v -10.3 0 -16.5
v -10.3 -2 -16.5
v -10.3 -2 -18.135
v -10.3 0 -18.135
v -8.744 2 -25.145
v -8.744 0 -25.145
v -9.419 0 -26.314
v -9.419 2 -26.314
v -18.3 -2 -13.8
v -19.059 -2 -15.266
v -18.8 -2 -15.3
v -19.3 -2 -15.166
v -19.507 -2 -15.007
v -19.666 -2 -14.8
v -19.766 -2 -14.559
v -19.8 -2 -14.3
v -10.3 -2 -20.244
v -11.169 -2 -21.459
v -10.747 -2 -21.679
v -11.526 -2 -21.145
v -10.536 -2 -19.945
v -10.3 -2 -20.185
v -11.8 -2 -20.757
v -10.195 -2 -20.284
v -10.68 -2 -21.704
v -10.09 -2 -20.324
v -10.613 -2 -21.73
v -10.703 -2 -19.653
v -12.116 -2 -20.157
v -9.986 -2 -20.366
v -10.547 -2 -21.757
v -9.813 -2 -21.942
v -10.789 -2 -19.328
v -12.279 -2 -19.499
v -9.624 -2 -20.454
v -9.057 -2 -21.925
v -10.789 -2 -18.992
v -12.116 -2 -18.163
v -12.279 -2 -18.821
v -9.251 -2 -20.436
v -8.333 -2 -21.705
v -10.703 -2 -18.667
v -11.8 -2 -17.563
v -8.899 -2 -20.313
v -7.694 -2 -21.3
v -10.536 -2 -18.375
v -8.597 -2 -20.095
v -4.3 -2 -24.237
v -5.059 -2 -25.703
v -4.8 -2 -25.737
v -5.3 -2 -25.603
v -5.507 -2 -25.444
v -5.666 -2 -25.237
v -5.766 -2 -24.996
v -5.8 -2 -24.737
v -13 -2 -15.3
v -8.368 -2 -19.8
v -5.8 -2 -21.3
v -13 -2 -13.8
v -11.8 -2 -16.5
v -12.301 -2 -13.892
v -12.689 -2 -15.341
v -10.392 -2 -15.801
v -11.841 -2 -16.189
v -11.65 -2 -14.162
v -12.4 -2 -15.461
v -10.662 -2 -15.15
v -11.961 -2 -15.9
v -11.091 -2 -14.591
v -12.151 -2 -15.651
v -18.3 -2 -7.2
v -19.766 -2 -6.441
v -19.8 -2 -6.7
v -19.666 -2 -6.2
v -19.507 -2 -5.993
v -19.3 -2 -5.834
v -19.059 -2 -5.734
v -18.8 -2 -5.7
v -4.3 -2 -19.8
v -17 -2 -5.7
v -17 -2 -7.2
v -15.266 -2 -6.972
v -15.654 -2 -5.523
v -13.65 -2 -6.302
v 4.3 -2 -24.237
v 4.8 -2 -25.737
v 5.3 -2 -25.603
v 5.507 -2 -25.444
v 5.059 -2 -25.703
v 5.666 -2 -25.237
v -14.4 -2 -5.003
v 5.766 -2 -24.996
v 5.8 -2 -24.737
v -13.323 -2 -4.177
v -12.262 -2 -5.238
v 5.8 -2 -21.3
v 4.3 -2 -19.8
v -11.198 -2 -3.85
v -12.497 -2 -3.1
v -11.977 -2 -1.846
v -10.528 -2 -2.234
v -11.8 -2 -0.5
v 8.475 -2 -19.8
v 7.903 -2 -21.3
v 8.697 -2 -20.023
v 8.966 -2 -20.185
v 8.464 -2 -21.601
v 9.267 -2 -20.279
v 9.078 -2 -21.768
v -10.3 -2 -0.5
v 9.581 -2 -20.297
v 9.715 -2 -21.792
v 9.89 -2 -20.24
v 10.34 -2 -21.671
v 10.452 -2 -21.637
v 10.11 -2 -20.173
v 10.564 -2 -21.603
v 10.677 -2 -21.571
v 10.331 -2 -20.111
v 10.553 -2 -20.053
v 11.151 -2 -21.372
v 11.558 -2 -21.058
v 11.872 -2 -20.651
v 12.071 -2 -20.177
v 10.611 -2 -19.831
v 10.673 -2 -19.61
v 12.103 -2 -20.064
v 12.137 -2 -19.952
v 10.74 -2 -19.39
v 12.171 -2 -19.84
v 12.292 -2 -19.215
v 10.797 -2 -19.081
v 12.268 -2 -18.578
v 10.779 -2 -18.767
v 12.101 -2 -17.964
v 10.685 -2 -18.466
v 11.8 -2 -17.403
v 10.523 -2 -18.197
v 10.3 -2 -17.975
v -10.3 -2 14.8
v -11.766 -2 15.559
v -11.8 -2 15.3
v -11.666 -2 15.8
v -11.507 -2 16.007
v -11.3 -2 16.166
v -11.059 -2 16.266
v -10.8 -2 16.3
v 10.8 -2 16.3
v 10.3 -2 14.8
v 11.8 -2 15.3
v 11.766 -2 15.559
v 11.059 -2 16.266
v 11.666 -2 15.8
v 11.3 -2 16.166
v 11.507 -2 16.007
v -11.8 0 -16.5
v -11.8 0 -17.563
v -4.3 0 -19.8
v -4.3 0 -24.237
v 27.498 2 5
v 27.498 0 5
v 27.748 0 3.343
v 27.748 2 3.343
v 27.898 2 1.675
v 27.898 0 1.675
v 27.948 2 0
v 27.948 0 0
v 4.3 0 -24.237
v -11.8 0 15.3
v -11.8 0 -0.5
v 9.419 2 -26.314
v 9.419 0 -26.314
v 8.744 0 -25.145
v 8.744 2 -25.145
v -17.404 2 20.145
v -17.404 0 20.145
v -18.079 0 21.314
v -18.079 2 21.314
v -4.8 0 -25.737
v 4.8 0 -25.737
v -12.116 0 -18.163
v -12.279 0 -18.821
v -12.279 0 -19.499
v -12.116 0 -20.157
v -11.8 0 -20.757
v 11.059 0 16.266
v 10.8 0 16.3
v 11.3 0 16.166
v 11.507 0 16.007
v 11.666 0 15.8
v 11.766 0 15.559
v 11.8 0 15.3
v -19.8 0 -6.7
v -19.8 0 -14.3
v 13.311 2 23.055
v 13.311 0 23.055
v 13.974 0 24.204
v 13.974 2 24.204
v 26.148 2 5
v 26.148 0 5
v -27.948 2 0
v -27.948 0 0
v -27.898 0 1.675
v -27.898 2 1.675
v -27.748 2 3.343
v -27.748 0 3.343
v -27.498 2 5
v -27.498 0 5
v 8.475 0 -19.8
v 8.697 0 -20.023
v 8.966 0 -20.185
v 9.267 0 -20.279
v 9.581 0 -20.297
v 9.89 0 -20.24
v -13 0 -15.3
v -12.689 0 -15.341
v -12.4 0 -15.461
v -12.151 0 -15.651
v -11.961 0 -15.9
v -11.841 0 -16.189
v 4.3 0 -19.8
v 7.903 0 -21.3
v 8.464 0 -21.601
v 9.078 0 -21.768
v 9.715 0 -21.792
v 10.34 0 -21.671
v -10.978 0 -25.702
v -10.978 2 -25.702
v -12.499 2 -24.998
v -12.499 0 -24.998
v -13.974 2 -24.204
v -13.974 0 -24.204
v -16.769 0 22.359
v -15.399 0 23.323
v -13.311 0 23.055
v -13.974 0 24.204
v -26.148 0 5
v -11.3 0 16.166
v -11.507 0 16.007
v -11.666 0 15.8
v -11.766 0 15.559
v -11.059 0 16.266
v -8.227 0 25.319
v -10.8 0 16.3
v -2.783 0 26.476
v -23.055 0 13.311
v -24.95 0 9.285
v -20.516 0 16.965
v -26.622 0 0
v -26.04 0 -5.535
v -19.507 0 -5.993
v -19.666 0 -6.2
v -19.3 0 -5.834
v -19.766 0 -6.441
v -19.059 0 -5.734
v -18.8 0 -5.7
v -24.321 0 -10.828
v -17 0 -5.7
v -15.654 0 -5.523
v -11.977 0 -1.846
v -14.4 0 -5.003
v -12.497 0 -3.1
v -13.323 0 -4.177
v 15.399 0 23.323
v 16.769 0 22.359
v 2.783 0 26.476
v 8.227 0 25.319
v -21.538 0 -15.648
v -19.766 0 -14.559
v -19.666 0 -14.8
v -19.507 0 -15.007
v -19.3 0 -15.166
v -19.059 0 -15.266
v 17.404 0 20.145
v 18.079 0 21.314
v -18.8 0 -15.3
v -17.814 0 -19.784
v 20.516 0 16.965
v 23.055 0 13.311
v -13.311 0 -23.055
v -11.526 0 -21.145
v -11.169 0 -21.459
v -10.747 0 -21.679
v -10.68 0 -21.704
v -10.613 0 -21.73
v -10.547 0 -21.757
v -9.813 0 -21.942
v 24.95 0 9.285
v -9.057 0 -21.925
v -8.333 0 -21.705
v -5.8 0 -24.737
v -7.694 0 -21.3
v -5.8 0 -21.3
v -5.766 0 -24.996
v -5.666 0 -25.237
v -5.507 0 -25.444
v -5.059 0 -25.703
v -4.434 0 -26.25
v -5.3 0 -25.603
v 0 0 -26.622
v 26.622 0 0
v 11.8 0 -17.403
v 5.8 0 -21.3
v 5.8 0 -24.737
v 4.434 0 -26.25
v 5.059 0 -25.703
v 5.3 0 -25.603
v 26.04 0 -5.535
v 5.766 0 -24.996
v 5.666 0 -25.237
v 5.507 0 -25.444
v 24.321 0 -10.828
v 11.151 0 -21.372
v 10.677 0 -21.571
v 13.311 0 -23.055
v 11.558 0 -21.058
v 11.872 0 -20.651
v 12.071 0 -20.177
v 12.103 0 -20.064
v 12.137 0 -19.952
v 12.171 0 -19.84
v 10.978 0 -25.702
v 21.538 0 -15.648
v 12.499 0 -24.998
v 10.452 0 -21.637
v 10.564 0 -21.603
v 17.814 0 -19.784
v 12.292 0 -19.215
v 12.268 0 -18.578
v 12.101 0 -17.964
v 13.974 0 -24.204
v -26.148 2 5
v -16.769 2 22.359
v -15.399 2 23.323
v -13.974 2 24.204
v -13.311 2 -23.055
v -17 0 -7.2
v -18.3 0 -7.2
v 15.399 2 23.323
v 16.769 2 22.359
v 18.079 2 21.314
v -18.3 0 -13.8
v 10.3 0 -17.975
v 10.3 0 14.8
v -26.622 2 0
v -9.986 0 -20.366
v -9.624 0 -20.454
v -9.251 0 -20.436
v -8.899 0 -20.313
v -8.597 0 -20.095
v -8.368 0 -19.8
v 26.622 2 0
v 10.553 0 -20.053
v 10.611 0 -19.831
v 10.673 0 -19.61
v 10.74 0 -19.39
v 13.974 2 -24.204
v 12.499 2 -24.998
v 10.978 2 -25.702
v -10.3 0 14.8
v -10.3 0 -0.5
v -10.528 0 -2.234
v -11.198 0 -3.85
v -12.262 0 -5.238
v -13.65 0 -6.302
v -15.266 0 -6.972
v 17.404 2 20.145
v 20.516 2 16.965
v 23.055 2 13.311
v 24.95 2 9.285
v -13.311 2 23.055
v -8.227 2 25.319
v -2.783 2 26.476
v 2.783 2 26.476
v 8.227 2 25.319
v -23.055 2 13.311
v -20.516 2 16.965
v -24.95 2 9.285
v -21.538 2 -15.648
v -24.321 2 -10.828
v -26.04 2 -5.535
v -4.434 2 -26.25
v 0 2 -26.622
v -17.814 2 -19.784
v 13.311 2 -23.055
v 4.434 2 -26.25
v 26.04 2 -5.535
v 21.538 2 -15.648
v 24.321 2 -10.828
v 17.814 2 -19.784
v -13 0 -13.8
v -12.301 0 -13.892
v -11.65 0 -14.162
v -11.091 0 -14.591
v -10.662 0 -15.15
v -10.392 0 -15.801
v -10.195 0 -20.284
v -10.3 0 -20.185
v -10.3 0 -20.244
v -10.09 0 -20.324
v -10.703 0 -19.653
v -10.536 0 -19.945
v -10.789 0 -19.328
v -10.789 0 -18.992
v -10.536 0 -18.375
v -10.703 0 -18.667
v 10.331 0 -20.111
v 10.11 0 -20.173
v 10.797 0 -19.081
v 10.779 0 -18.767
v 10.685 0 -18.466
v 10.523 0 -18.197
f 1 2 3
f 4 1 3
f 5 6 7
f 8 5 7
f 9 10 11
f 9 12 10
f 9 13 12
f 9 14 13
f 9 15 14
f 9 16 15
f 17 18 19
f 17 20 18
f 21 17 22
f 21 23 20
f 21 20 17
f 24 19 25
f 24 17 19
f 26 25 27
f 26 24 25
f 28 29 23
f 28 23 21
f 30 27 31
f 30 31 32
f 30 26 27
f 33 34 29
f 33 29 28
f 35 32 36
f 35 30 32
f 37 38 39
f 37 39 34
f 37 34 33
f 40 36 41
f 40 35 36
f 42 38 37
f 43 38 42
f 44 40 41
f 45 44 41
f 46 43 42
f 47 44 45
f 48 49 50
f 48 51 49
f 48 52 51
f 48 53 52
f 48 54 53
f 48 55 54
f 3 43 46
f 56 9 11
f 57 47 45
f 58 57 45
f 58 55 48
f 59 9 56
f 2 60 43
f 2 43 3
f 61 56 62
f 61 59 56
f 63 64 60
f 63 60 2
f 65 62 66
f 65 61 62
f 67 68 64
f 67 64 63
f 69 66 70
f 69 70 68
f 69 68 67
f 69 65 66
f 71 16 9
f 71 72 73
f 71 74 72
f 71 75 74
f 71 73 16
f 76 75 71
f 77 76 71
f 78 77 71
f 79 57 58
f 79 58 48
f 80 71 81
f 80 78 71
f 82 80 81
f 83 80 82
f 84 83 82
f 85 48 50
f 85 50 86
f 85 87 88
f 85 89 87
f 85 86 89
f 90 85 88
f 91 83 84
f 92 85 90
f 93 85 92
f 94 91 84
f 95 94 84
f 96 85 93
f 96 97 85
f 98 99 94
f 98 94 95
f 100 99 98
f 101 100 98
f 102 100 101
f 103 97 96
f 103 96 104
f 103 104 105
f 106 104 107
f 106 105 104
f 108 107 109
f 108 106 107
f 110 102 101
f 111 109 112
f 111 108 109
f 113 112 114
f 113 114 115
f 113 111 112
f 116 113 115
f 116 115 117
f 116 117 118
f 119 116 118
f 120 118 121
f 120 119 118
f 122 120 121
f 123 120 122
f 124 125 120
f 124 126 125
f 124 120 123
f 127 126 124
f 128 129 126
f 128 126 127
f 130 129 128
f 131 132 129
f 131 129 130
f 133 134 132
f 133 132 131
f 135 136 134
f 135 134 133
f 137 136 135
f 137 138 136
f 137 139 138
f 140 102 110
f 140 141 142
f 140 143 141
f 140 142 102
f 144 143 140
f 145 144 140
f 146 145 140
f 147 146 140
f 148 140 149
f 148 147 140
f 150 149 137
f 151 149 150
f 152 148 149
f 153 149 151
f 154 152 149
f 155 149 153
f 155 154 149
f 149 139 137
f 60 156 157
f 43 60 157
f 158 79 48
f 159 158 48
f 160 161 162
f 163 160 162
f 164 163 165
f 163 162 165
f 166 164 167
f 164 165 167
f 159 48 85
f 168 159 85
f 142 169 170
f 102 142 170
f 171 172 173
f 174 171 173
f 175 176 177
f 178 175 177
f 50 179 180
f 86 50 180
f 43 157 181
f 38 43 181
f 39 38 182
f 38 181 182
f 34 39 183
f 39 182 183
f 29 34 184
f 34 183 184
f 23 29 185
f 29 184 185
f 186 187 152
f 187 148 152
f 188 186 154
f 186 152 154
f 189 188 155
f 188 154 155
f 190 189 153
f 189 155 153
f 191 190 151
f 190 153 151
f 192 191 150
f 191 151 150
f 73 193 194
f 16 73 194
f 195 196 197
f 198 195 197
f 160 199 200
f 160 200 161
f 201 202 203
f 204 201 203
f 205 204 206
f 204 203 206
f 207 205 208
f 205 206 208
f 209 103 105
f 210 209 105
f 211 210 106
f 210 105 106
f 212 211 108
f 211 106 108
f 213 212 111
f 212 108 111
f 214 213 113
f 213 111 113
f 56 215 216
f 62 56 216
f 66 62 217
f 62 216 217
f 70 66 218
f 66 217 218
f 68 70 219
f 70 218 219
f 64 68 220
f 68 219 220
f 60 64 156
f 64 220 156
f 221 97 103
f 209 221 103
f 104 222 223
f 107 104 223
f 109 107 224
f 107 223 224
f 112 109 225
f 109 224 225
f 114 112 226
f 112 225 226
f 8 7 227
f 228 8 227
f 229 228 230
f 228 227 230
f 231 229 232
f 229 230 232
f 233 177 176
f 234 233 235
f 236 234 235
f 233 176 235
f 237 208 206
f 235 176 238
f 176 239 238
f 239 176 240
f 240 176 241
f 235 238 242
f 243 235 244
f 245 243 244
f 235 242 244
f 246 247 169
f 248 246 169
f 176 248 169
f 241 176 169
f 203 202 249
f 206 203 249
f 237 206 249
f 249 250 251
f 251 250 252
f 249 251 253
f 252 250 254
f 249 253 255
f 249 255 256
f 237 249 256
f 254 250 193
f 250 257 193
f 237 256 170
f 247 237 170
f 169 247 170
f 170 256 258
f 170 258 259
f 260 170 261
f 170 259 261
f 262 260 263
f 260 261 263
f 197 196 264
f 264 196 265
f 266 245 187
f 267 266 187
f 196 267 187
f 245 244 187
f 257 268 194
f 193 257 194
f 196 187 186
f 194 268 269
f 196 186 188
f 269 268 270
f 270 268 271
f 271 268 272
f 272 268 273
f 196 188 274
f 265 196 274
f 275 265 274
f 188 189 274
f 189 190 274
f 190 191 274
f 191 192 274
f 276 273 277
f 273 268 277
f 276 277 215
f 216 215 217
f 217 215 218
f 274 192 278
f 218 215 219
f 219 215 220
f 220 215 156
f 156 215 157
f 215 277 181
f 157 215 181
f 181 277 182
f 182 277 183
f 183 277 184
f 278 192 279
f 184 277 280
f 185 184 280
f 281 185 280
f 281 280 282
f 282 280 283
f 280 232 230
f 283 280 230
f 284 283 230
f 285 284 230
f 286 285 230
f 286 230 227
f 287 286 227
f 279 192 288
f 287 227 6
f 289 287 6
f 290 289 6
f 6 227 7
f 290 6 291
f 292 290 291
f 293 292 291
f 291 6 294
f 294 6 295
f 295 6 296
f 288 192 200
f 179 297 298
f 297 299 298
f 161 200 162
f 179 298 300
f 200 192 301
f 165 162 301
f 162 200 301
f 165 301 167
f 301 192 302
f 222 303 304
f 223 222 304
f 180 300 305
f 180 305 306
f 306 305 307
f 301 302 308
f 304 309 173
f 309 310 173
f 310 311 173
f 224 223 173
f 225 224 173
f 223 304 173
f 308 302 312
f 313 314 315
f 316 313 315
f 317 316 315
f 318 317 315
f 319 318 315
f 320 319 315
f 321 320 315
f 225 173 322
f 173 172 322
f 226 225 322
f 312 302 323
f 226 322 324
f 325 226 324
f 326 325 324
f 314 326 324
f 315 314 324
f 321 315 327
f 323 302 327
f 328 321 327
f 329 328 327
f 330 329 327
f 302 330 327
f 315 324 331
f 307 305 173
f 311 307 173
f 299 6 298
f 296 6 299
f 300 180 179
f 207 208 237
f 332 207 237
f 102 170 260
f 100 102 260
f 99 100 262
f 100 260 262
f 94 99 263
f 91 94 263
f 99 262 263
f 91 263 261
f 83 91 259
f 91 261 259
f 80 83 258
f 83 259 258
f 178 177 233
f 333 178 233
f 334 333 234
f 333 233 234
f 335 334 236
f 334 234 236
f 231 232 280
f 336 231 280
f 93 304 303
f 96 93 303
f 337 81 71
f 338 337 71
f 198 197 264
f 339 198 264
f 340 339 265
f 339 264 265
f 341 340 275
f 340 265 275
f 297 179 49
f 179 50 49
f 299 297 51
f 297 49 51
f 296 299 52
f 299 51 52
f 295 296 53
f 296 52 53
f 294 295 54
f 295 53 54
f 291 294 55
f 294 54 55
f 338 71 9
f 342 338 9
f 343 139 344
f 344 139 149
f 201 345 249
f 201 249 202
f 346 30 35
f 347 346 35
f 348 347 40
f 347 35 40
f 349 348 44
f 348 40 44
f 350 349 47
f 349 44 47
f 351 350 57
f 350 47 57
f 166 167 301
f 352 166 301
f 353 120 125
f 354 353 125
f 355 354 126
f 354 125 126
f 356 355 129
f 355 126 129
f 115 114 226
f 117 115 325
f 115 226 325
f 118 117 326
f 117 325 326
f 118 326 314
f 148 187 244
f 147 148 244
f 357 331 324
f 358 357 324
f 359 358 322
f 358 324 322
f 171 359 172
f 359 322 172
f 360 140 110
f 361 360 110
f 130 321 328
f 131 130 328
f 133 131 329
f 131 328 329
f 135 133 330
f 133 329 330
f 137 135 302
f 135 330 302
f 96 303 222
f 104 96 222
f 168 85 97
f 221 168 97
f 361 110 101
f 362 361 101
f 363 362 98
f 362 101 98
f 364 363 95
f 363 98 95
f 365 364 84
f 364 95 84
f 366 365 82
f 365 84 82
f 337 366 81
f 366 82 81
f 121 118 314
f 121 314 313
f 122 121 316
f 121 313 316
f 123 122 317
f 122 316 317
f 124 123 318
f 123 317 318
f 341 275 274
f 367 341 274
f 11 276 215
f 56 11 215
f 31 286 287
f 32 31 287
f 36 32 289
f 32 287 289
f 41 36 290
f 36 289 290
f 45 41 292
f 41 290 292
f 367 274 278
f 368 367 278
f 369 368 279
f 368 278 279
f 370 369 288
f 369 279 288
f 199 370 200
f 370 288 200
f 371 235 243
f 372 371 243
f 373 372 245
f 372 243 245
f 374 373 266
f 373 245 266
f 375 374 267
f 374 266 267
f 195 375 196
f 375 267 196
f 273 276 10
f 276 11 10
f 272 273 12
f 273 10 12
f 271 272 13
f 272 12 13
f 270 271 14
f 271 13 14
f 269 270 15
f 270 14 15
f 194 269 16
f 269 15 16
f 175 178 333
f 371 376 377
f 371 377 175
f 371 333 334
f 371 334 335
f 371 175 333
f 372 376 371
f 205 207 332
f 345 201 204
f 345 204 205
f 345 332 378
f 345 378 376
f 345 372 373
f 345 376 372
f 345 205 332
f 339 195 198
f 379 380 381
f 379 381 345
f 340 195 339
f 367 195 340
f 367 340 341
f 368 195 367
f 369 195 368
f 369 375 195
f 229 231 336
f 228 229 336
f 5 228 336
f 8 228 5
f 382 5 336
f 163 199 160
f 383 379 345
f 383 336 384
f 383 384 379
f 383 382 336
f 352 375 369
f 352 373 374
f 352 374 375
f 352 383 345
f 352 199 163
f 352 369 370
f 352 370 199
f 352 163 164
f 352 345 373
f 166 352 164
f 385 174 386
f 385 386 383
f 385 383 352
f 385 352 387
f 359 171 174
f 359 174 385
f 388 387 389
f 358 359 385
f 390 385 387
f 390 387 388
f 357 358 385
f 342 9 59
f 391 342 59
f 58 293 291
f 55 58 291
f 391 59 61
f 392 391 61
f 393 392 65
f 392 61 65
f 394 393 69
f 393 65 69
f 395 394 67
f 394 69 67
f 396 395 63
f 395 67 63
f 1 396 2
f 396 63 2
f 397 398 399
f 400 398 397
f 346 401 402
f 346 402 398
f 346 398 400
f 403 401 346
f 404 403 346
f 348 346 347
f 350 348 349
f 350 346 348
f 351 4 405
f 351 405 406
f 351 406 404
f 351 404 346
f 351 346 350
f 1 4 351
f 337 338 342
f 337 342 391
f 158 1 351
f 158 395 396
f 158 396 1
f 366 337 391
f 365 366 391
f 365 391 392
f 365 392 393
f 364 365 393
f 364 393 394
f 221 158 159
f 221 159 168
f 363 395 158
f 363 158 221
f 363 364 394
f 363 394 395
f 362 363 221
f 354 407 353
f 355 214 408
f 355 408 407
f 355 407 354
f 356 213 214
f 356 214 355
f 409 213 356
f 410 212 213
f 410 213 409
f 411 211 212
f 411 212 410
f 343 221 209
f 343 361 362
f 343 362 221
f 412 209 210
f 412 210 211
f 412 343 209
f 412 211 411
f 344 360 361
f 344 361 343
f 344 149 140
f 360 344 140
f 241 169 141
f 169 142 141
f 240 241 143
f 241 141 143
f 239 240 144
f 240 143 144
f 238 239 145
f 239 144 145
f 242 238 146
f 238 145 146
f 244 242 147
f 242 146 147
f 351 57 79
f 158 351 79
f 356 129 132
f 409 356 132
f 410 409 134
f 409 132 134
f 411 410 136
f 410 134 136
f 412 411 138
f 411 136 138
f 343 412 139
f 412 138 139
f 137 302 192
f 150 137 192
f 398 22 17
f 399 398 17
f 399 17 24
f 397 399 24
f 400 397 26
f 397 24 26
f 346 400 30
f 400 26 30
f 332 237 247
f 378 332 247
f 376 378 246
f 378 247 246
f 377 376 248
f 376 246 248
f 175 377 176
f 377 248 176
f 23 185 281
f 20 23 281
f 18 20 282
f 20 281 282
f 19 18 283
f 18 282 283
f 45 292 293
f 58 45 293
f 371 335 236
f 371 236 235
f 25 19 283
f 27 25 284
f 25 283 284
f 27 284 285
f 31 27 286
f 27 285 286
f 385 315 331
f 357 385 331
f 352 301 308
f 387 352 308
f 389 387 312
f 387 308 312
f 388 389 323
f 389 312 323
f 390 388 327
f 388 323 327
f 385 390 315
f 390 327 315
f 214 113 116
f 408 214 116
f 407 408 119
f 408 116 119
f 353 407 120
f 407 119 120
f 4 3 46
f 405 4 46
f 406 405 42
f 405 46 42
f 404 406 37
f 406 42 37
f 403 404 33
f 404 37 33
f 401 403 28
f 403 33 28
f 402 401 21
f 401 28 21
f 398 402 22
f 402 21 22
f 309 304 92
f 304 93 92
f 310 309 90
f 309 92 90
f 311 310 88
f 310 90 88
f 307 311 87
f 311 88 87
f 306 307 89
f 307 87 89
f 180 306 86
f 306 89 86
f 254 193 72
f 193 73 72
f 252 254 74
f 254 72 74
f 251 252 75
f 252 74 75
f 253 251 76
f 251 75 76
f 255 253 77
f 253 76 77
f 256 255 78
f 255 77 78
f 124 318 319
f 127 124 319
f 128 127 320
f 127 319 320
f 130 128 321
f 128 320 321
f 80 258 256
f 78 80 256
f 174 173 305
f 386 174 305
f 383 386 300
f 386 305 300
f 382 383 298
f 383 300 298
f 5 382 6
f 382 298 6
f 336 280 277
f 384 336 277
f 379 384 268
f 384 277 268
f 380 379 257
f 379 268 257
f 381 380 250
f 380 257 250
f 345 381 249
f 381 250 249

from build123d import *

# Parameters (mm, degrees)
BOSS_EXTRUDE1_DEPTH = 2
BOSS_EXTRUDE2_DEPTH = 2
CUT_EXTRUDE1_DEPTH  = 2
FILLET1_R           = 2
FILLET2_R           = 1


with BuildPart() as part:
    # Sketch1 → Boss-Extrude1 (new body)
    with BuildSketch(Plane(origin=(0, 0, 0), x_dir=(1, 0, 0), z_dir=(0, 1, 0))):
        with BuildLine():
            Line((13.311072252, 23.055453444), (13.974197662, 24.204020346))
            ThreePointArc((13.974197662, 24.204020346), (11.743873388, 25.361274397), (9.418625663, 26.313538185))
            Line((9.418625663, 26.313538185), (8.744070643, 25.145174619))
            ThreePointArc((8.744070643, 25.145174619), (0, 26.622144504), (-8.744070643, 25.145174619))
            Line((-8.744070643, 25.145174619), (-9.418625663, 26.313538185))
            ThreePointArc((-9.418625663, 26.313538185), (-11.743873388, 25.361274397), (-13.974197662, 24.204020346))
            Line((-13.974197662, 24.204020346), (-13.311072252, 23.055453444))
            ThreePointArc((-13.311072252, 23.055453444), (-23.055453444, 13.311072252), (-26.622144504, 0))
            Line((-26.622144504, 0), (-27.948395324, 0))
            ThreePointArc((-27.948395324, 0), (-27.835444594, -2.510144506), (-27.497505363, -5))
            Line((-27.497505363, -5), (-26.148395324, -5))
            ThreePointArc((-26.148395324, -5), (-23.055453444, -13.311072252), (-17.404324681, -20.145174619))
            Line((-17.404324681, -20.145174619), (-18.0788797, -21.313538185))
            ThreePointArc((-18.0788797, -21.313538185), (-16.091571206, -22.851129891), (-13.974197662, -24.204020346))
            Line((-13.974197662, -24.204020346), (-13.311072252, -23.055453444))
            ThreePointArc((-13.311072252, -23.055453444), (0, -26.622144504), (13.311072252, -23.055453444))
            Line((13.311072252, -23.055453444), (13.974197662, -24.204020346))
            ThreePointArc((13.974197662, -24.204020346), (16.091571206, -22.851129891), (18.0788797, -21.313538185))
            Line((18.0788797, -21.313538185), (17.404324681, -20.145174619))
            ThreePointArc((17.404324681, -20.145174619), (23.055453444, -13.311072252), (26.148395324, -5))
            Line((26.148395324, -5), (27.497505363, -5))
            ThreePointArc((27.497505363, -5), (27.835444594, -2.510144506), (27.948395324, 0))
            Line((27.948395324, 0), (26.622144504, 0))
            ThreePointArc((26.622144504, 0), (23.055453444, 13.311072252), (13.311072252, 23.055453444))
        make_face()
    extrude(amount=BOSS_EXTRUDE1_DEPTH)

    # Sketch2 → Boss-Extrude2 (add)
    with BuildSketch(Plane.XZ):
        with BuildLine():
            Line((-5.8, -25.737204514), (5.8, -25.737204514))
            Line((5.8, -25.737204514), (5.8, -21.3))
            Line((5.8, -21.3), (7.903128058, -21.3))
            ThreePointArc((7.903128058, -21.3), (9.07834188, -21.768068718), (10.339619988, -21.671149242))
            ThreePointArc((10.339619988, -21.671149242), (11.075305639, -21.469795949), (11.823980776, -21.323980776))
            ThreePointArc((11.823980776, -21.323980776), (11.969795949, -20.575305639), (12.171149242, -19.839619988))
            ThreePointArc((12.171149242, -19.839619988), (12.268068718, -18.57834188), (11.8, -17.403128058))
            Line((11.8, -17.403128058), (11.8, 16.3))
            Line((11.8, 16.3), (-11.8, 16.3))
            Line((-11.8, 16.3), (-11.8, -0.5))
            ThreePointArc((-11.8, -0.5), (-13.323044738, -4.176955262), (-17, -5.7))
            Line((-17, -5.7), (-19.8, -5.7))
            Line((-19.8, -5.7), (-19.8, -15.3))
            Line((-19.8, -15.3), (-13, -15.3))
            ThreePointArc((-13, -15.3), (-12.151471863, -15.651471863), (-11.8, -16.5))
            Line((-11.8, -16.5), (-11.8, -17.563099043))
            ThreePointArc((-11.8, -17.563099043), (-12.3, -19.159970985), (-11.8, -20.756842927))
            Line((-11.8, -20.756842927), (-11.8, -21.343991953))
            ThreePointArc((-11.8, -21.343991953), (-11.166576007, -21.530222711), (-10.546527145, -21.757042593))
            ThreePointArc((-10.546527145, -21.757042593), (-9.056966413, -21.924699044), (-7.694376613, -21.3))
            Line((-7.694376613, -21.3), (-5.8, -21.3))
            Line((-5.8, -21.3), (-5.8, -25.737204514))
        make_face()
    extrude(amount=BOSS_EXTRUDE2_DEPTH)

    # Sketch4 → Cut-Extrude1 (cut)
    with BuildSketch(Plane.XZ.offset(2)):
        with BuildLine():
            Line((-4.3, -19.8), (-4.3, -24.237204514))
            Line((-4.3, -24.237204514), (4.3, -24.237204514))
            Line((4.3, -24.237204514), (4.3, -19.8))
            Line((4.3, -19.8), (8.475304923, -19.8))
            ThreePointArc((8.475304923, -19.8), (9.113730299, -20.241287927), (9.889823566, -20.240176434))
            ThreePointArc((9.889823566, -20.240176434), (10.220030244, -20.141701714), (10.552993589, -20.052993589))
            ThreePointArc((10.552993589, -20.052993589), (10.641701714, -19.720030244), (10.740176434, -19.389823566))
            ThreePointArc((10.740176434, -19.389823566), (10.741287927, -18.613730299), (10.3, -17.975304923))
            Line((10.3, -17.975304923), (10.3, 14.8))
            Line((10.3, 14.8), (-10.3, 14.8))
            Line((-10.3, 14.8), (-10.3, -0.5))
            ThreePointArc((-10.3, -0.5), (-12.262384566, -5.237615434), (-17, -7.2))
            Line((-17, -7.2), (-18.3, -7.2))
            Line((-18.3, -7.2), (-18.3, -13.8))
            Line((-18.3, -13.8), (-13, -13.8))
            ThreePointArc((-13, -13.8), (-11.090811691, -14.590811691), (-10.3, -16.5))
            Line((-10.3, -16.5), (-10.3, -18.135275908))
            ThreePointArc((-10.3, -18.135275908), (-10.8, -19.159970985), (-10.3, -20.184666062))
            Line((-10.3, -20.184666062), (-10.3, -20.244402637))
            ThreePointArc((-10.3, -20.244402637), (-10.1425072, -20.303948315), (-9.985887603, -20.365754231))
            ThreePointArc((-9.985887603, -20.365754231), (-9.070775843, -20.387067812), (-8.368468799, -19.8))
            Line((-8.368468799, -19.8), (-4.3, -19.8))
        make_face()
    extrude(amount=-CUT_EXTRUDE1_DEPTH, mode=Mode.SUBTRACT)

    # Fillet1
    # the kernel refuses this fillet: 2 mm, written as the material it takes off along each edge
    with BuildSketch(Plane(origin=(11.823980776, 0, -21.323980776), x_dir=(0.21089533444820466, 0, 0.977508648508022), z_dir=(0, -1, 0))) as fillet1_piece_1:
        with BuildLine():
            CenterArc((1.288021457, 1.996690902), FILLET1_R, 207.646032977, 59.057586609)
            Line((-0.48364068, 1.068675131), (-0.519073923, 1.050114816))
            ThreePointArc((-0.519073923, 1.050114816), (-0.262887012, 0.524803612), (-0.037329873, -0.014369433))
            Line((-0.037329873, -0.014369433), (0.002300038, -0.039933818))
            ThreePointArc((0.002300038, -0.039933818), (0.586509771, -0.023123602), (1.170719503, -0.039933818))
            Line((1.170719503, -0.039933818), (1.173019541, 0))
        make_face()
    extrude(amount=4.932548853, mode=Mode.SUBTRACT)
    with BuildSketch(Plane(origin=(-11.8, 0, -21.343991953), x_dir=(0.9530196078830334, 0, -0.3029086116149048), z_dir=(0, -1, 0))) as fillet1_piece_2:
        with BuildLine():
            CenterArc((1.212682202, 1.99706697), FILLET1_R, 225.951474685, 40.945152222)
            Line((-0.177852496, 0.559564534), (-0.20566319, 0.530814485))
            ThreePointArc((-0.20566319, 0.530814485), (-0.127047032, 0.267665923), (-0.038120784, -0.012116344))
            Line((-0.038120784, -0.012116344), (0.002165504, -0.039941339))
            ThreePointArc((0.002165504, -0.039941339), (0.552203503, -0.025041546), (1.102241502, -0.039941339))
            Line((1.102241502, -0.039941339), (1.104407006, 0))
        make_face()
    extrude(amount=4.761017514, mode=Mode.SUBTRACT)

    # Fillet2
    fillet2_edges = [part.edges().sort_by_distance(p)[0] for p in [
        (-5.8, -1, -25.737204514),
        (5.8, -1, -25.737204514),
        (11.8, -1, 16.3),
        (-11.8, -1, 16.3),
        (-19.8, -1, -5.7),
        (-19.8, -1, -15.3),
    ]]
    fillet(fillet2_edges, radius=FILLET2_R)


solid = part.part
